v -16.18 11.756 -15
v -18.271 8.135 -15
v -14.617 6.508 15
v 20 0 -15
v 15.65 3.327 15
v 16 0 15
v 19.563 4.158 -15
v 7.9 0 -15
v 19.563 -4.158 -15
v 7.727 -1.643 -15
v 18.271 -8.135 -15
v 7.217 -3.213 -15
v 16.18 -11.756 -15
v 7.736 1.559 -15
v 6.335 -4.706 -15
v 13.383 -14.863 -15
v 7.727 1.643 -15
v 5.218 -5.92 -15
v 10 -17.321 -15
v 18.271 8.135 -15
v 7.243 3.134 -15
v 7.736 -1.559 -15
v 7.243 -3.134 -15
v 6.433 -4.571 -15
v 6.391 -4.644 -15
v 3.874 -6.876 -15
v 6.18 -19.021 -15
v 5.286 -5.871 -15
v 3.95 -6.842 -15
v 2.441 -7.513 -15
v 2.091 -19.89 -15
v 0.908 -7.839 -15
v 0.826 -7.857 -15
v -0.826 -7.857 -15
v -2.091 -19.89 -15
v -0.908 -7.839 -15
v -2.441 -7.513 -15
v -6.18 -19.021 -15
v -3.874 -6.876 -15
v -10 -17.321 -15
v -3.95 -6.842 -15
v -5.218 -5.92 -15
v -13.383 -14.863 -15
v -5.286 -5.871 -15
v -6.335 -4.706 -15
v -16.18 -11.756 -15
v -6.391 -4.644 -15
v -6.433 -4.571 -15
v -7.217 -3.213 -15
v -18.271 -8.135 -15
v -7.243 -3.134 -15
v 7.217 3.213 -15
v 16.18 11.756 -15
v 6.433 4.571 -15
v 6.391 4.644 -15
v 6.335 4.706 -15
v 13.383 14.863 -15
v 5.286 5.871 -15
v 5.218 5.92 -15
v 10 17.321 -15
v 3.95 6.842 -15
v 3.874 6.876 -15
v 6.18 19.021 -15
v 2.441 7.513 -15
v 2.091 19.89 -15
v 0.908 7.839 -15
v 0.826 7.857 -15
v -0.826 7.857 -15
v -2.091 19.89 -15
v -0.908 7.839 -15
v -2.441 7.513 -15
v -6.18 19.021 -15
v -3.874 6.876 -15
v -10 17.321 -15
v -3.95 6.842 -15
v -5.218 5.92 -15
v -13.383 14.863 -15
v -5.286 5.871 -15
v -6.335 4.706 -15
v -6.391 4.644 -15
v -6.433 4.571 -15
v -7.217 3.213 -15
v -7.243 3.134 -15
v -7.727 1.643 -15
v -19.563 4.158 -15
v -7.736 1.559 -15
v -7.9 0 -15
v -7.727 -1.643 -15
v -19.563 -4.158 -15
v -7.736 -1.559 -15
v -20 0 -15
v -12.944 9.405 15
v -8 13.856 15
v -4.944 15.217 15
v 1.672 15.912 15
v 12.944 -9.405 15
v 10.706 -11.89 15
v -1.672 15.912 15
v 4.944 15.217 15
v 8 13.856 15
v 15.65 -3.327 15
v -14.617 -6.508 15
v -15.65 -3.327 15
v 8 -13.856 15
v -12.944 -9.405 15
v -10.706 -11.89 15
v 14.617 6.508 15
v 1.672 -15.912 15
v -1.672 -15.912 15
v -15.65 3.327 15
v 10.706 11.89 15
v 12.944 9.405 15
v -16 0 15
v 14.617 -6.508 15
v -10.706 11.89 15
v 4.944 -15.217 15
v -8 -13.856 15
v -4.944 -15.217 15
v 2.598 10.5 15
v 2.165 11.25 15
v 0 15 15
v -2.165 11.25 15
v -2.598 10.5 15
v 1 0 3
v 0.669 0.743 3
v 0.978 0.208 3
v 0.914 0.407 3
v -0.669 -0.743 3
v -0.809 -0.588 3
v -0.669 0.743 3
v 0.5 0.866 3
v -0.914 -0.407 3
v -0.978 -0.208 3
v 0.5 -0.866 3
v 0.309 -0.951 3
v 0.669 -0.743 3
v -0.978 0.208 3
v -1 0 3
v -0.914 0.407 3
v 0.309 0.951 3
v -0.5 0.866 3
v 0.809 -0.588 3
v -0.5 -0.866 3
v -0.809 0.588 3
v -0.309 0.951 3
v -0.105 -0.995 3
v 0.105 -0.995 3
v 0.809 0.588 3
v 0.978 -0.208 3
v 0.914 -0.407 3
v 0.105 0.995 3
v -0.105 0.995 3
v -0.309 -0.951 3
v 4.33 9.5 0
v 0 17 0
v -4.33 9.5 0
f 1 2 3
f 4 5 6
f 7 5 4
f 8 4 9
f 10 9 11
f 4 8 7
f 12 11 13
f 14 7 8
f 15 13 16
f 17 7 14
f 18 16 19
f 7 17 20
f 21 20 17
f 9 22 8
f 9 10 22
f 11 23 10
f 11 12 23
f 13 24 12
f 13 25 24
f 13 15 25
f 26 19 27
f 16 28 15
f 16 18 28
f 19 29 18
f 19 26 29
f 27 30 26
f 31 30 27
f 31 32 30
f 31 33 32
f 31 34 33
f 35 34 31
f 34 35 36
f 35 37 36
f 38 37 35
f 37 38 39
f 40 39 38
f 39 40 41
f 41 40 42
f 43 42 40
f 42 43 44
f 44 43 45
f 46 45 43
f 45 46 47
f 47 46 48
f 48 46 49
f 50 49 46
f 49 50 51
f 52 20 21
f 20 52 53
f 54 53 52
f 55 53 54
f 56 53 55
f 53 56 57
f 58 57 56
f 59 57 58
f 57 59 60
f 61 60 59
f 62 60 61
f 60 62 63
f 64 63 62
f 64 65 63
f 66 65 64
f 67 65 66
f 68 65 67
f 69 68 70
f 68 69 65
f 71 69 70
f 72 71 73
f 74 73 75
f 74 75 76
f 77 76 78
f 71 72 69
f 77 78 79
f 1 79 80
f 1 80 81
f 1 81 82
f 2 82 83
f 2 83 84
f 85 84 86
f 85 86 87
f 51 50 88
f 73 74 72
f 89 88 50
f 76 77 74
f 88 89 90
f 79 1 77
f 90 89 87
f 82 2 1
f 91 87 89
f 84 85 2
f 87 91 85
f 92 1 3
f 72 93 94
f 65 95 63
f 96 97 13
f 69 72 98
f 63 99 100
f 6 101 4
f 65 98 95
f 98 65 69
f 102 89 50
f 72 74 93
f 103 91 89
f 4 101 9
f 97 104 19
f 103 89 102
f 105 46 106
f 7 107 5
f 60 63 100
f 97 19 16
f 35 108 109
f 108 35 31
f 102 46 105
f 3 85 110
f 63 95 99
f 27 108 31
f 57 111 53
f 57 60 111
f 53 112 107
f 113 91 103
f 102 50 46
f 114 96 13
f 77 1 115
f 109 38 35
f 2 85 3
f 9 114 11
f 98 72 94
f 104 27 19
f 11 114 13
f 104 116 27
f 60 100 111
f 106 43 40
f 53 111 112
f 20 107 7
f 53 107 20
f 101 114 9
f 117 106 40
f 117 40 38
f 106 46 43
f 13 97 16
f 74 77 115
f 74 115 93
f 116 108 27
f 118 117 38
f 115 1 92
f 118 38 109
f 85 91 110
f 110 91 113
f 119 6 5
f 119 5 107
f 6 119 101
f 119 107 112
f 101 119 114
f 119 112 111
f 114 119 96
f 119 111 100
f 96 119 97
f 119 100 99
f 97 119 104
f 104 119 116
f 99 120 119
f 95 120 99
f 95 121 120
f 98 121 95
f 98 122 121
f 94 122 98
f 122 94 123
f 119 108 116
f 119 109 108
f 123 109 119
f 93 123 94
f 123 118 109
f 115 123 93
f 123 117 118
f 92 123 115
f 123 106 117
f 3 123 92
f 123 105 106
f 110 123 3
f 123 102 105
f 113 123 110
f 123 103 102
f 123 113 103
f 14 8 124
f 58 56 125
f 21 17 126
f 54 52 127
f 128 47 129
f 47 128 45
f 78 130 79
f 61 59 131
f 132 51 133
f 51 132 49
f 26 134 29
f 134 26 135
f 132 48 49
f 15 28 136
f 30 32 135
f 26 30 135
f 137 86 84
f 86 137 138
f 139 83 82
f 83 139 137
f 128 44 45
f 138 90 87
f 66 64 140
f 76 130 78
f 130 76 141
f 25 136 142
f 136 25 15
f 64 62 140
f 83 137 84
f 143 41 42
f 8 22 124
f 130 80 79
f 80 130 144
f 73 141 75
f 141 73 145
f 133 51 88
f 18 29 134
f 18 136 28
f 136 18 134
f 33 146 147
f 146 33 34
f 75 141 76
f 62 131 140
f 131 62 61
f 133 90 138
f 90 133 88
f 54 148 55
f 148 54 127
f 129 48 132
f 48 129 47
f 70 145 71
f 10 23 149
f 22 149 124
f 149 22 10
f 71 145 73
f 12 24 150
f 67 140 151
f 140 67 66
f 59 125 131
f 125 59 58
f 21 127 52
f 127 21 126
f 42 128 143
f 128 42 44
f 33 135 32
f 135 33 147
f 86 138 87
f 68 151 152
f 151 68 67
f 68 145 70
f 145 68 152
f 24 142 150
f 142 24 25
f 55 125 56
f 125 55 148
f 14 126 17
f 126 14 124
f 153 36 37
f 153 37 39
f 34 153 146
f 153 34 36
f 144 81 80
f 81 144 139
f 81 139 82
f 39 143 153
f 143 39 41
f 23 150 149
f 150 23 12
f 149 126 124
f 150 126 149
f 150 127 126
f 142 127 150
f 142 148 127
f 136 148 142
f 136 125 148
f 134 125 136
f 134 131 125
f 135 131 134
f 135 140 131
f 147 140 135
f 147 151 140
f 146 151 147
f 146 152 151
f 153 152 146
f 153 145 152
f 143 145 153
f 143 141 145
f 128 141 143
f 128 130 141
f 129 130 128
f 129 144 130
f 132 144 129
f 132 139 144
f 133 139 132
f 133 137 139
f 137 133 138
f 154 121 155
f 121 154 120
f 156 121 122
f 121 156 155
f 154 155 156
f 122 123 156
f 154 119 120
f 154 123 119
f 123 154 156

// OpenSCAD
//parameters include the height of the knob, the knob's diameter, diameter of the shaft, whether or not the knob has a notched top as an indicator

module potentiometerKnob (knobHeight, knobDiameter, shaftDiameter, notchedTop) {

difference(){
cylinder(knobHeight, knobDiameter,(knobDiameter)*0.8, true);
translate([0,0,-(knobHeight*0.9)])
cylinder(knobHeight, shaftDiameter, true);

if(notchedTop==true){
translate([0,knobDiameter*0.6,0])
rotate([0,0,210])
cylinder(knobHeight, 5, true, $fn=3);
}//end of if notchedTop
}//end of difference

}//end of potentiometerKnob module

potentiometerKnob(30, 20, 12.5, true);
